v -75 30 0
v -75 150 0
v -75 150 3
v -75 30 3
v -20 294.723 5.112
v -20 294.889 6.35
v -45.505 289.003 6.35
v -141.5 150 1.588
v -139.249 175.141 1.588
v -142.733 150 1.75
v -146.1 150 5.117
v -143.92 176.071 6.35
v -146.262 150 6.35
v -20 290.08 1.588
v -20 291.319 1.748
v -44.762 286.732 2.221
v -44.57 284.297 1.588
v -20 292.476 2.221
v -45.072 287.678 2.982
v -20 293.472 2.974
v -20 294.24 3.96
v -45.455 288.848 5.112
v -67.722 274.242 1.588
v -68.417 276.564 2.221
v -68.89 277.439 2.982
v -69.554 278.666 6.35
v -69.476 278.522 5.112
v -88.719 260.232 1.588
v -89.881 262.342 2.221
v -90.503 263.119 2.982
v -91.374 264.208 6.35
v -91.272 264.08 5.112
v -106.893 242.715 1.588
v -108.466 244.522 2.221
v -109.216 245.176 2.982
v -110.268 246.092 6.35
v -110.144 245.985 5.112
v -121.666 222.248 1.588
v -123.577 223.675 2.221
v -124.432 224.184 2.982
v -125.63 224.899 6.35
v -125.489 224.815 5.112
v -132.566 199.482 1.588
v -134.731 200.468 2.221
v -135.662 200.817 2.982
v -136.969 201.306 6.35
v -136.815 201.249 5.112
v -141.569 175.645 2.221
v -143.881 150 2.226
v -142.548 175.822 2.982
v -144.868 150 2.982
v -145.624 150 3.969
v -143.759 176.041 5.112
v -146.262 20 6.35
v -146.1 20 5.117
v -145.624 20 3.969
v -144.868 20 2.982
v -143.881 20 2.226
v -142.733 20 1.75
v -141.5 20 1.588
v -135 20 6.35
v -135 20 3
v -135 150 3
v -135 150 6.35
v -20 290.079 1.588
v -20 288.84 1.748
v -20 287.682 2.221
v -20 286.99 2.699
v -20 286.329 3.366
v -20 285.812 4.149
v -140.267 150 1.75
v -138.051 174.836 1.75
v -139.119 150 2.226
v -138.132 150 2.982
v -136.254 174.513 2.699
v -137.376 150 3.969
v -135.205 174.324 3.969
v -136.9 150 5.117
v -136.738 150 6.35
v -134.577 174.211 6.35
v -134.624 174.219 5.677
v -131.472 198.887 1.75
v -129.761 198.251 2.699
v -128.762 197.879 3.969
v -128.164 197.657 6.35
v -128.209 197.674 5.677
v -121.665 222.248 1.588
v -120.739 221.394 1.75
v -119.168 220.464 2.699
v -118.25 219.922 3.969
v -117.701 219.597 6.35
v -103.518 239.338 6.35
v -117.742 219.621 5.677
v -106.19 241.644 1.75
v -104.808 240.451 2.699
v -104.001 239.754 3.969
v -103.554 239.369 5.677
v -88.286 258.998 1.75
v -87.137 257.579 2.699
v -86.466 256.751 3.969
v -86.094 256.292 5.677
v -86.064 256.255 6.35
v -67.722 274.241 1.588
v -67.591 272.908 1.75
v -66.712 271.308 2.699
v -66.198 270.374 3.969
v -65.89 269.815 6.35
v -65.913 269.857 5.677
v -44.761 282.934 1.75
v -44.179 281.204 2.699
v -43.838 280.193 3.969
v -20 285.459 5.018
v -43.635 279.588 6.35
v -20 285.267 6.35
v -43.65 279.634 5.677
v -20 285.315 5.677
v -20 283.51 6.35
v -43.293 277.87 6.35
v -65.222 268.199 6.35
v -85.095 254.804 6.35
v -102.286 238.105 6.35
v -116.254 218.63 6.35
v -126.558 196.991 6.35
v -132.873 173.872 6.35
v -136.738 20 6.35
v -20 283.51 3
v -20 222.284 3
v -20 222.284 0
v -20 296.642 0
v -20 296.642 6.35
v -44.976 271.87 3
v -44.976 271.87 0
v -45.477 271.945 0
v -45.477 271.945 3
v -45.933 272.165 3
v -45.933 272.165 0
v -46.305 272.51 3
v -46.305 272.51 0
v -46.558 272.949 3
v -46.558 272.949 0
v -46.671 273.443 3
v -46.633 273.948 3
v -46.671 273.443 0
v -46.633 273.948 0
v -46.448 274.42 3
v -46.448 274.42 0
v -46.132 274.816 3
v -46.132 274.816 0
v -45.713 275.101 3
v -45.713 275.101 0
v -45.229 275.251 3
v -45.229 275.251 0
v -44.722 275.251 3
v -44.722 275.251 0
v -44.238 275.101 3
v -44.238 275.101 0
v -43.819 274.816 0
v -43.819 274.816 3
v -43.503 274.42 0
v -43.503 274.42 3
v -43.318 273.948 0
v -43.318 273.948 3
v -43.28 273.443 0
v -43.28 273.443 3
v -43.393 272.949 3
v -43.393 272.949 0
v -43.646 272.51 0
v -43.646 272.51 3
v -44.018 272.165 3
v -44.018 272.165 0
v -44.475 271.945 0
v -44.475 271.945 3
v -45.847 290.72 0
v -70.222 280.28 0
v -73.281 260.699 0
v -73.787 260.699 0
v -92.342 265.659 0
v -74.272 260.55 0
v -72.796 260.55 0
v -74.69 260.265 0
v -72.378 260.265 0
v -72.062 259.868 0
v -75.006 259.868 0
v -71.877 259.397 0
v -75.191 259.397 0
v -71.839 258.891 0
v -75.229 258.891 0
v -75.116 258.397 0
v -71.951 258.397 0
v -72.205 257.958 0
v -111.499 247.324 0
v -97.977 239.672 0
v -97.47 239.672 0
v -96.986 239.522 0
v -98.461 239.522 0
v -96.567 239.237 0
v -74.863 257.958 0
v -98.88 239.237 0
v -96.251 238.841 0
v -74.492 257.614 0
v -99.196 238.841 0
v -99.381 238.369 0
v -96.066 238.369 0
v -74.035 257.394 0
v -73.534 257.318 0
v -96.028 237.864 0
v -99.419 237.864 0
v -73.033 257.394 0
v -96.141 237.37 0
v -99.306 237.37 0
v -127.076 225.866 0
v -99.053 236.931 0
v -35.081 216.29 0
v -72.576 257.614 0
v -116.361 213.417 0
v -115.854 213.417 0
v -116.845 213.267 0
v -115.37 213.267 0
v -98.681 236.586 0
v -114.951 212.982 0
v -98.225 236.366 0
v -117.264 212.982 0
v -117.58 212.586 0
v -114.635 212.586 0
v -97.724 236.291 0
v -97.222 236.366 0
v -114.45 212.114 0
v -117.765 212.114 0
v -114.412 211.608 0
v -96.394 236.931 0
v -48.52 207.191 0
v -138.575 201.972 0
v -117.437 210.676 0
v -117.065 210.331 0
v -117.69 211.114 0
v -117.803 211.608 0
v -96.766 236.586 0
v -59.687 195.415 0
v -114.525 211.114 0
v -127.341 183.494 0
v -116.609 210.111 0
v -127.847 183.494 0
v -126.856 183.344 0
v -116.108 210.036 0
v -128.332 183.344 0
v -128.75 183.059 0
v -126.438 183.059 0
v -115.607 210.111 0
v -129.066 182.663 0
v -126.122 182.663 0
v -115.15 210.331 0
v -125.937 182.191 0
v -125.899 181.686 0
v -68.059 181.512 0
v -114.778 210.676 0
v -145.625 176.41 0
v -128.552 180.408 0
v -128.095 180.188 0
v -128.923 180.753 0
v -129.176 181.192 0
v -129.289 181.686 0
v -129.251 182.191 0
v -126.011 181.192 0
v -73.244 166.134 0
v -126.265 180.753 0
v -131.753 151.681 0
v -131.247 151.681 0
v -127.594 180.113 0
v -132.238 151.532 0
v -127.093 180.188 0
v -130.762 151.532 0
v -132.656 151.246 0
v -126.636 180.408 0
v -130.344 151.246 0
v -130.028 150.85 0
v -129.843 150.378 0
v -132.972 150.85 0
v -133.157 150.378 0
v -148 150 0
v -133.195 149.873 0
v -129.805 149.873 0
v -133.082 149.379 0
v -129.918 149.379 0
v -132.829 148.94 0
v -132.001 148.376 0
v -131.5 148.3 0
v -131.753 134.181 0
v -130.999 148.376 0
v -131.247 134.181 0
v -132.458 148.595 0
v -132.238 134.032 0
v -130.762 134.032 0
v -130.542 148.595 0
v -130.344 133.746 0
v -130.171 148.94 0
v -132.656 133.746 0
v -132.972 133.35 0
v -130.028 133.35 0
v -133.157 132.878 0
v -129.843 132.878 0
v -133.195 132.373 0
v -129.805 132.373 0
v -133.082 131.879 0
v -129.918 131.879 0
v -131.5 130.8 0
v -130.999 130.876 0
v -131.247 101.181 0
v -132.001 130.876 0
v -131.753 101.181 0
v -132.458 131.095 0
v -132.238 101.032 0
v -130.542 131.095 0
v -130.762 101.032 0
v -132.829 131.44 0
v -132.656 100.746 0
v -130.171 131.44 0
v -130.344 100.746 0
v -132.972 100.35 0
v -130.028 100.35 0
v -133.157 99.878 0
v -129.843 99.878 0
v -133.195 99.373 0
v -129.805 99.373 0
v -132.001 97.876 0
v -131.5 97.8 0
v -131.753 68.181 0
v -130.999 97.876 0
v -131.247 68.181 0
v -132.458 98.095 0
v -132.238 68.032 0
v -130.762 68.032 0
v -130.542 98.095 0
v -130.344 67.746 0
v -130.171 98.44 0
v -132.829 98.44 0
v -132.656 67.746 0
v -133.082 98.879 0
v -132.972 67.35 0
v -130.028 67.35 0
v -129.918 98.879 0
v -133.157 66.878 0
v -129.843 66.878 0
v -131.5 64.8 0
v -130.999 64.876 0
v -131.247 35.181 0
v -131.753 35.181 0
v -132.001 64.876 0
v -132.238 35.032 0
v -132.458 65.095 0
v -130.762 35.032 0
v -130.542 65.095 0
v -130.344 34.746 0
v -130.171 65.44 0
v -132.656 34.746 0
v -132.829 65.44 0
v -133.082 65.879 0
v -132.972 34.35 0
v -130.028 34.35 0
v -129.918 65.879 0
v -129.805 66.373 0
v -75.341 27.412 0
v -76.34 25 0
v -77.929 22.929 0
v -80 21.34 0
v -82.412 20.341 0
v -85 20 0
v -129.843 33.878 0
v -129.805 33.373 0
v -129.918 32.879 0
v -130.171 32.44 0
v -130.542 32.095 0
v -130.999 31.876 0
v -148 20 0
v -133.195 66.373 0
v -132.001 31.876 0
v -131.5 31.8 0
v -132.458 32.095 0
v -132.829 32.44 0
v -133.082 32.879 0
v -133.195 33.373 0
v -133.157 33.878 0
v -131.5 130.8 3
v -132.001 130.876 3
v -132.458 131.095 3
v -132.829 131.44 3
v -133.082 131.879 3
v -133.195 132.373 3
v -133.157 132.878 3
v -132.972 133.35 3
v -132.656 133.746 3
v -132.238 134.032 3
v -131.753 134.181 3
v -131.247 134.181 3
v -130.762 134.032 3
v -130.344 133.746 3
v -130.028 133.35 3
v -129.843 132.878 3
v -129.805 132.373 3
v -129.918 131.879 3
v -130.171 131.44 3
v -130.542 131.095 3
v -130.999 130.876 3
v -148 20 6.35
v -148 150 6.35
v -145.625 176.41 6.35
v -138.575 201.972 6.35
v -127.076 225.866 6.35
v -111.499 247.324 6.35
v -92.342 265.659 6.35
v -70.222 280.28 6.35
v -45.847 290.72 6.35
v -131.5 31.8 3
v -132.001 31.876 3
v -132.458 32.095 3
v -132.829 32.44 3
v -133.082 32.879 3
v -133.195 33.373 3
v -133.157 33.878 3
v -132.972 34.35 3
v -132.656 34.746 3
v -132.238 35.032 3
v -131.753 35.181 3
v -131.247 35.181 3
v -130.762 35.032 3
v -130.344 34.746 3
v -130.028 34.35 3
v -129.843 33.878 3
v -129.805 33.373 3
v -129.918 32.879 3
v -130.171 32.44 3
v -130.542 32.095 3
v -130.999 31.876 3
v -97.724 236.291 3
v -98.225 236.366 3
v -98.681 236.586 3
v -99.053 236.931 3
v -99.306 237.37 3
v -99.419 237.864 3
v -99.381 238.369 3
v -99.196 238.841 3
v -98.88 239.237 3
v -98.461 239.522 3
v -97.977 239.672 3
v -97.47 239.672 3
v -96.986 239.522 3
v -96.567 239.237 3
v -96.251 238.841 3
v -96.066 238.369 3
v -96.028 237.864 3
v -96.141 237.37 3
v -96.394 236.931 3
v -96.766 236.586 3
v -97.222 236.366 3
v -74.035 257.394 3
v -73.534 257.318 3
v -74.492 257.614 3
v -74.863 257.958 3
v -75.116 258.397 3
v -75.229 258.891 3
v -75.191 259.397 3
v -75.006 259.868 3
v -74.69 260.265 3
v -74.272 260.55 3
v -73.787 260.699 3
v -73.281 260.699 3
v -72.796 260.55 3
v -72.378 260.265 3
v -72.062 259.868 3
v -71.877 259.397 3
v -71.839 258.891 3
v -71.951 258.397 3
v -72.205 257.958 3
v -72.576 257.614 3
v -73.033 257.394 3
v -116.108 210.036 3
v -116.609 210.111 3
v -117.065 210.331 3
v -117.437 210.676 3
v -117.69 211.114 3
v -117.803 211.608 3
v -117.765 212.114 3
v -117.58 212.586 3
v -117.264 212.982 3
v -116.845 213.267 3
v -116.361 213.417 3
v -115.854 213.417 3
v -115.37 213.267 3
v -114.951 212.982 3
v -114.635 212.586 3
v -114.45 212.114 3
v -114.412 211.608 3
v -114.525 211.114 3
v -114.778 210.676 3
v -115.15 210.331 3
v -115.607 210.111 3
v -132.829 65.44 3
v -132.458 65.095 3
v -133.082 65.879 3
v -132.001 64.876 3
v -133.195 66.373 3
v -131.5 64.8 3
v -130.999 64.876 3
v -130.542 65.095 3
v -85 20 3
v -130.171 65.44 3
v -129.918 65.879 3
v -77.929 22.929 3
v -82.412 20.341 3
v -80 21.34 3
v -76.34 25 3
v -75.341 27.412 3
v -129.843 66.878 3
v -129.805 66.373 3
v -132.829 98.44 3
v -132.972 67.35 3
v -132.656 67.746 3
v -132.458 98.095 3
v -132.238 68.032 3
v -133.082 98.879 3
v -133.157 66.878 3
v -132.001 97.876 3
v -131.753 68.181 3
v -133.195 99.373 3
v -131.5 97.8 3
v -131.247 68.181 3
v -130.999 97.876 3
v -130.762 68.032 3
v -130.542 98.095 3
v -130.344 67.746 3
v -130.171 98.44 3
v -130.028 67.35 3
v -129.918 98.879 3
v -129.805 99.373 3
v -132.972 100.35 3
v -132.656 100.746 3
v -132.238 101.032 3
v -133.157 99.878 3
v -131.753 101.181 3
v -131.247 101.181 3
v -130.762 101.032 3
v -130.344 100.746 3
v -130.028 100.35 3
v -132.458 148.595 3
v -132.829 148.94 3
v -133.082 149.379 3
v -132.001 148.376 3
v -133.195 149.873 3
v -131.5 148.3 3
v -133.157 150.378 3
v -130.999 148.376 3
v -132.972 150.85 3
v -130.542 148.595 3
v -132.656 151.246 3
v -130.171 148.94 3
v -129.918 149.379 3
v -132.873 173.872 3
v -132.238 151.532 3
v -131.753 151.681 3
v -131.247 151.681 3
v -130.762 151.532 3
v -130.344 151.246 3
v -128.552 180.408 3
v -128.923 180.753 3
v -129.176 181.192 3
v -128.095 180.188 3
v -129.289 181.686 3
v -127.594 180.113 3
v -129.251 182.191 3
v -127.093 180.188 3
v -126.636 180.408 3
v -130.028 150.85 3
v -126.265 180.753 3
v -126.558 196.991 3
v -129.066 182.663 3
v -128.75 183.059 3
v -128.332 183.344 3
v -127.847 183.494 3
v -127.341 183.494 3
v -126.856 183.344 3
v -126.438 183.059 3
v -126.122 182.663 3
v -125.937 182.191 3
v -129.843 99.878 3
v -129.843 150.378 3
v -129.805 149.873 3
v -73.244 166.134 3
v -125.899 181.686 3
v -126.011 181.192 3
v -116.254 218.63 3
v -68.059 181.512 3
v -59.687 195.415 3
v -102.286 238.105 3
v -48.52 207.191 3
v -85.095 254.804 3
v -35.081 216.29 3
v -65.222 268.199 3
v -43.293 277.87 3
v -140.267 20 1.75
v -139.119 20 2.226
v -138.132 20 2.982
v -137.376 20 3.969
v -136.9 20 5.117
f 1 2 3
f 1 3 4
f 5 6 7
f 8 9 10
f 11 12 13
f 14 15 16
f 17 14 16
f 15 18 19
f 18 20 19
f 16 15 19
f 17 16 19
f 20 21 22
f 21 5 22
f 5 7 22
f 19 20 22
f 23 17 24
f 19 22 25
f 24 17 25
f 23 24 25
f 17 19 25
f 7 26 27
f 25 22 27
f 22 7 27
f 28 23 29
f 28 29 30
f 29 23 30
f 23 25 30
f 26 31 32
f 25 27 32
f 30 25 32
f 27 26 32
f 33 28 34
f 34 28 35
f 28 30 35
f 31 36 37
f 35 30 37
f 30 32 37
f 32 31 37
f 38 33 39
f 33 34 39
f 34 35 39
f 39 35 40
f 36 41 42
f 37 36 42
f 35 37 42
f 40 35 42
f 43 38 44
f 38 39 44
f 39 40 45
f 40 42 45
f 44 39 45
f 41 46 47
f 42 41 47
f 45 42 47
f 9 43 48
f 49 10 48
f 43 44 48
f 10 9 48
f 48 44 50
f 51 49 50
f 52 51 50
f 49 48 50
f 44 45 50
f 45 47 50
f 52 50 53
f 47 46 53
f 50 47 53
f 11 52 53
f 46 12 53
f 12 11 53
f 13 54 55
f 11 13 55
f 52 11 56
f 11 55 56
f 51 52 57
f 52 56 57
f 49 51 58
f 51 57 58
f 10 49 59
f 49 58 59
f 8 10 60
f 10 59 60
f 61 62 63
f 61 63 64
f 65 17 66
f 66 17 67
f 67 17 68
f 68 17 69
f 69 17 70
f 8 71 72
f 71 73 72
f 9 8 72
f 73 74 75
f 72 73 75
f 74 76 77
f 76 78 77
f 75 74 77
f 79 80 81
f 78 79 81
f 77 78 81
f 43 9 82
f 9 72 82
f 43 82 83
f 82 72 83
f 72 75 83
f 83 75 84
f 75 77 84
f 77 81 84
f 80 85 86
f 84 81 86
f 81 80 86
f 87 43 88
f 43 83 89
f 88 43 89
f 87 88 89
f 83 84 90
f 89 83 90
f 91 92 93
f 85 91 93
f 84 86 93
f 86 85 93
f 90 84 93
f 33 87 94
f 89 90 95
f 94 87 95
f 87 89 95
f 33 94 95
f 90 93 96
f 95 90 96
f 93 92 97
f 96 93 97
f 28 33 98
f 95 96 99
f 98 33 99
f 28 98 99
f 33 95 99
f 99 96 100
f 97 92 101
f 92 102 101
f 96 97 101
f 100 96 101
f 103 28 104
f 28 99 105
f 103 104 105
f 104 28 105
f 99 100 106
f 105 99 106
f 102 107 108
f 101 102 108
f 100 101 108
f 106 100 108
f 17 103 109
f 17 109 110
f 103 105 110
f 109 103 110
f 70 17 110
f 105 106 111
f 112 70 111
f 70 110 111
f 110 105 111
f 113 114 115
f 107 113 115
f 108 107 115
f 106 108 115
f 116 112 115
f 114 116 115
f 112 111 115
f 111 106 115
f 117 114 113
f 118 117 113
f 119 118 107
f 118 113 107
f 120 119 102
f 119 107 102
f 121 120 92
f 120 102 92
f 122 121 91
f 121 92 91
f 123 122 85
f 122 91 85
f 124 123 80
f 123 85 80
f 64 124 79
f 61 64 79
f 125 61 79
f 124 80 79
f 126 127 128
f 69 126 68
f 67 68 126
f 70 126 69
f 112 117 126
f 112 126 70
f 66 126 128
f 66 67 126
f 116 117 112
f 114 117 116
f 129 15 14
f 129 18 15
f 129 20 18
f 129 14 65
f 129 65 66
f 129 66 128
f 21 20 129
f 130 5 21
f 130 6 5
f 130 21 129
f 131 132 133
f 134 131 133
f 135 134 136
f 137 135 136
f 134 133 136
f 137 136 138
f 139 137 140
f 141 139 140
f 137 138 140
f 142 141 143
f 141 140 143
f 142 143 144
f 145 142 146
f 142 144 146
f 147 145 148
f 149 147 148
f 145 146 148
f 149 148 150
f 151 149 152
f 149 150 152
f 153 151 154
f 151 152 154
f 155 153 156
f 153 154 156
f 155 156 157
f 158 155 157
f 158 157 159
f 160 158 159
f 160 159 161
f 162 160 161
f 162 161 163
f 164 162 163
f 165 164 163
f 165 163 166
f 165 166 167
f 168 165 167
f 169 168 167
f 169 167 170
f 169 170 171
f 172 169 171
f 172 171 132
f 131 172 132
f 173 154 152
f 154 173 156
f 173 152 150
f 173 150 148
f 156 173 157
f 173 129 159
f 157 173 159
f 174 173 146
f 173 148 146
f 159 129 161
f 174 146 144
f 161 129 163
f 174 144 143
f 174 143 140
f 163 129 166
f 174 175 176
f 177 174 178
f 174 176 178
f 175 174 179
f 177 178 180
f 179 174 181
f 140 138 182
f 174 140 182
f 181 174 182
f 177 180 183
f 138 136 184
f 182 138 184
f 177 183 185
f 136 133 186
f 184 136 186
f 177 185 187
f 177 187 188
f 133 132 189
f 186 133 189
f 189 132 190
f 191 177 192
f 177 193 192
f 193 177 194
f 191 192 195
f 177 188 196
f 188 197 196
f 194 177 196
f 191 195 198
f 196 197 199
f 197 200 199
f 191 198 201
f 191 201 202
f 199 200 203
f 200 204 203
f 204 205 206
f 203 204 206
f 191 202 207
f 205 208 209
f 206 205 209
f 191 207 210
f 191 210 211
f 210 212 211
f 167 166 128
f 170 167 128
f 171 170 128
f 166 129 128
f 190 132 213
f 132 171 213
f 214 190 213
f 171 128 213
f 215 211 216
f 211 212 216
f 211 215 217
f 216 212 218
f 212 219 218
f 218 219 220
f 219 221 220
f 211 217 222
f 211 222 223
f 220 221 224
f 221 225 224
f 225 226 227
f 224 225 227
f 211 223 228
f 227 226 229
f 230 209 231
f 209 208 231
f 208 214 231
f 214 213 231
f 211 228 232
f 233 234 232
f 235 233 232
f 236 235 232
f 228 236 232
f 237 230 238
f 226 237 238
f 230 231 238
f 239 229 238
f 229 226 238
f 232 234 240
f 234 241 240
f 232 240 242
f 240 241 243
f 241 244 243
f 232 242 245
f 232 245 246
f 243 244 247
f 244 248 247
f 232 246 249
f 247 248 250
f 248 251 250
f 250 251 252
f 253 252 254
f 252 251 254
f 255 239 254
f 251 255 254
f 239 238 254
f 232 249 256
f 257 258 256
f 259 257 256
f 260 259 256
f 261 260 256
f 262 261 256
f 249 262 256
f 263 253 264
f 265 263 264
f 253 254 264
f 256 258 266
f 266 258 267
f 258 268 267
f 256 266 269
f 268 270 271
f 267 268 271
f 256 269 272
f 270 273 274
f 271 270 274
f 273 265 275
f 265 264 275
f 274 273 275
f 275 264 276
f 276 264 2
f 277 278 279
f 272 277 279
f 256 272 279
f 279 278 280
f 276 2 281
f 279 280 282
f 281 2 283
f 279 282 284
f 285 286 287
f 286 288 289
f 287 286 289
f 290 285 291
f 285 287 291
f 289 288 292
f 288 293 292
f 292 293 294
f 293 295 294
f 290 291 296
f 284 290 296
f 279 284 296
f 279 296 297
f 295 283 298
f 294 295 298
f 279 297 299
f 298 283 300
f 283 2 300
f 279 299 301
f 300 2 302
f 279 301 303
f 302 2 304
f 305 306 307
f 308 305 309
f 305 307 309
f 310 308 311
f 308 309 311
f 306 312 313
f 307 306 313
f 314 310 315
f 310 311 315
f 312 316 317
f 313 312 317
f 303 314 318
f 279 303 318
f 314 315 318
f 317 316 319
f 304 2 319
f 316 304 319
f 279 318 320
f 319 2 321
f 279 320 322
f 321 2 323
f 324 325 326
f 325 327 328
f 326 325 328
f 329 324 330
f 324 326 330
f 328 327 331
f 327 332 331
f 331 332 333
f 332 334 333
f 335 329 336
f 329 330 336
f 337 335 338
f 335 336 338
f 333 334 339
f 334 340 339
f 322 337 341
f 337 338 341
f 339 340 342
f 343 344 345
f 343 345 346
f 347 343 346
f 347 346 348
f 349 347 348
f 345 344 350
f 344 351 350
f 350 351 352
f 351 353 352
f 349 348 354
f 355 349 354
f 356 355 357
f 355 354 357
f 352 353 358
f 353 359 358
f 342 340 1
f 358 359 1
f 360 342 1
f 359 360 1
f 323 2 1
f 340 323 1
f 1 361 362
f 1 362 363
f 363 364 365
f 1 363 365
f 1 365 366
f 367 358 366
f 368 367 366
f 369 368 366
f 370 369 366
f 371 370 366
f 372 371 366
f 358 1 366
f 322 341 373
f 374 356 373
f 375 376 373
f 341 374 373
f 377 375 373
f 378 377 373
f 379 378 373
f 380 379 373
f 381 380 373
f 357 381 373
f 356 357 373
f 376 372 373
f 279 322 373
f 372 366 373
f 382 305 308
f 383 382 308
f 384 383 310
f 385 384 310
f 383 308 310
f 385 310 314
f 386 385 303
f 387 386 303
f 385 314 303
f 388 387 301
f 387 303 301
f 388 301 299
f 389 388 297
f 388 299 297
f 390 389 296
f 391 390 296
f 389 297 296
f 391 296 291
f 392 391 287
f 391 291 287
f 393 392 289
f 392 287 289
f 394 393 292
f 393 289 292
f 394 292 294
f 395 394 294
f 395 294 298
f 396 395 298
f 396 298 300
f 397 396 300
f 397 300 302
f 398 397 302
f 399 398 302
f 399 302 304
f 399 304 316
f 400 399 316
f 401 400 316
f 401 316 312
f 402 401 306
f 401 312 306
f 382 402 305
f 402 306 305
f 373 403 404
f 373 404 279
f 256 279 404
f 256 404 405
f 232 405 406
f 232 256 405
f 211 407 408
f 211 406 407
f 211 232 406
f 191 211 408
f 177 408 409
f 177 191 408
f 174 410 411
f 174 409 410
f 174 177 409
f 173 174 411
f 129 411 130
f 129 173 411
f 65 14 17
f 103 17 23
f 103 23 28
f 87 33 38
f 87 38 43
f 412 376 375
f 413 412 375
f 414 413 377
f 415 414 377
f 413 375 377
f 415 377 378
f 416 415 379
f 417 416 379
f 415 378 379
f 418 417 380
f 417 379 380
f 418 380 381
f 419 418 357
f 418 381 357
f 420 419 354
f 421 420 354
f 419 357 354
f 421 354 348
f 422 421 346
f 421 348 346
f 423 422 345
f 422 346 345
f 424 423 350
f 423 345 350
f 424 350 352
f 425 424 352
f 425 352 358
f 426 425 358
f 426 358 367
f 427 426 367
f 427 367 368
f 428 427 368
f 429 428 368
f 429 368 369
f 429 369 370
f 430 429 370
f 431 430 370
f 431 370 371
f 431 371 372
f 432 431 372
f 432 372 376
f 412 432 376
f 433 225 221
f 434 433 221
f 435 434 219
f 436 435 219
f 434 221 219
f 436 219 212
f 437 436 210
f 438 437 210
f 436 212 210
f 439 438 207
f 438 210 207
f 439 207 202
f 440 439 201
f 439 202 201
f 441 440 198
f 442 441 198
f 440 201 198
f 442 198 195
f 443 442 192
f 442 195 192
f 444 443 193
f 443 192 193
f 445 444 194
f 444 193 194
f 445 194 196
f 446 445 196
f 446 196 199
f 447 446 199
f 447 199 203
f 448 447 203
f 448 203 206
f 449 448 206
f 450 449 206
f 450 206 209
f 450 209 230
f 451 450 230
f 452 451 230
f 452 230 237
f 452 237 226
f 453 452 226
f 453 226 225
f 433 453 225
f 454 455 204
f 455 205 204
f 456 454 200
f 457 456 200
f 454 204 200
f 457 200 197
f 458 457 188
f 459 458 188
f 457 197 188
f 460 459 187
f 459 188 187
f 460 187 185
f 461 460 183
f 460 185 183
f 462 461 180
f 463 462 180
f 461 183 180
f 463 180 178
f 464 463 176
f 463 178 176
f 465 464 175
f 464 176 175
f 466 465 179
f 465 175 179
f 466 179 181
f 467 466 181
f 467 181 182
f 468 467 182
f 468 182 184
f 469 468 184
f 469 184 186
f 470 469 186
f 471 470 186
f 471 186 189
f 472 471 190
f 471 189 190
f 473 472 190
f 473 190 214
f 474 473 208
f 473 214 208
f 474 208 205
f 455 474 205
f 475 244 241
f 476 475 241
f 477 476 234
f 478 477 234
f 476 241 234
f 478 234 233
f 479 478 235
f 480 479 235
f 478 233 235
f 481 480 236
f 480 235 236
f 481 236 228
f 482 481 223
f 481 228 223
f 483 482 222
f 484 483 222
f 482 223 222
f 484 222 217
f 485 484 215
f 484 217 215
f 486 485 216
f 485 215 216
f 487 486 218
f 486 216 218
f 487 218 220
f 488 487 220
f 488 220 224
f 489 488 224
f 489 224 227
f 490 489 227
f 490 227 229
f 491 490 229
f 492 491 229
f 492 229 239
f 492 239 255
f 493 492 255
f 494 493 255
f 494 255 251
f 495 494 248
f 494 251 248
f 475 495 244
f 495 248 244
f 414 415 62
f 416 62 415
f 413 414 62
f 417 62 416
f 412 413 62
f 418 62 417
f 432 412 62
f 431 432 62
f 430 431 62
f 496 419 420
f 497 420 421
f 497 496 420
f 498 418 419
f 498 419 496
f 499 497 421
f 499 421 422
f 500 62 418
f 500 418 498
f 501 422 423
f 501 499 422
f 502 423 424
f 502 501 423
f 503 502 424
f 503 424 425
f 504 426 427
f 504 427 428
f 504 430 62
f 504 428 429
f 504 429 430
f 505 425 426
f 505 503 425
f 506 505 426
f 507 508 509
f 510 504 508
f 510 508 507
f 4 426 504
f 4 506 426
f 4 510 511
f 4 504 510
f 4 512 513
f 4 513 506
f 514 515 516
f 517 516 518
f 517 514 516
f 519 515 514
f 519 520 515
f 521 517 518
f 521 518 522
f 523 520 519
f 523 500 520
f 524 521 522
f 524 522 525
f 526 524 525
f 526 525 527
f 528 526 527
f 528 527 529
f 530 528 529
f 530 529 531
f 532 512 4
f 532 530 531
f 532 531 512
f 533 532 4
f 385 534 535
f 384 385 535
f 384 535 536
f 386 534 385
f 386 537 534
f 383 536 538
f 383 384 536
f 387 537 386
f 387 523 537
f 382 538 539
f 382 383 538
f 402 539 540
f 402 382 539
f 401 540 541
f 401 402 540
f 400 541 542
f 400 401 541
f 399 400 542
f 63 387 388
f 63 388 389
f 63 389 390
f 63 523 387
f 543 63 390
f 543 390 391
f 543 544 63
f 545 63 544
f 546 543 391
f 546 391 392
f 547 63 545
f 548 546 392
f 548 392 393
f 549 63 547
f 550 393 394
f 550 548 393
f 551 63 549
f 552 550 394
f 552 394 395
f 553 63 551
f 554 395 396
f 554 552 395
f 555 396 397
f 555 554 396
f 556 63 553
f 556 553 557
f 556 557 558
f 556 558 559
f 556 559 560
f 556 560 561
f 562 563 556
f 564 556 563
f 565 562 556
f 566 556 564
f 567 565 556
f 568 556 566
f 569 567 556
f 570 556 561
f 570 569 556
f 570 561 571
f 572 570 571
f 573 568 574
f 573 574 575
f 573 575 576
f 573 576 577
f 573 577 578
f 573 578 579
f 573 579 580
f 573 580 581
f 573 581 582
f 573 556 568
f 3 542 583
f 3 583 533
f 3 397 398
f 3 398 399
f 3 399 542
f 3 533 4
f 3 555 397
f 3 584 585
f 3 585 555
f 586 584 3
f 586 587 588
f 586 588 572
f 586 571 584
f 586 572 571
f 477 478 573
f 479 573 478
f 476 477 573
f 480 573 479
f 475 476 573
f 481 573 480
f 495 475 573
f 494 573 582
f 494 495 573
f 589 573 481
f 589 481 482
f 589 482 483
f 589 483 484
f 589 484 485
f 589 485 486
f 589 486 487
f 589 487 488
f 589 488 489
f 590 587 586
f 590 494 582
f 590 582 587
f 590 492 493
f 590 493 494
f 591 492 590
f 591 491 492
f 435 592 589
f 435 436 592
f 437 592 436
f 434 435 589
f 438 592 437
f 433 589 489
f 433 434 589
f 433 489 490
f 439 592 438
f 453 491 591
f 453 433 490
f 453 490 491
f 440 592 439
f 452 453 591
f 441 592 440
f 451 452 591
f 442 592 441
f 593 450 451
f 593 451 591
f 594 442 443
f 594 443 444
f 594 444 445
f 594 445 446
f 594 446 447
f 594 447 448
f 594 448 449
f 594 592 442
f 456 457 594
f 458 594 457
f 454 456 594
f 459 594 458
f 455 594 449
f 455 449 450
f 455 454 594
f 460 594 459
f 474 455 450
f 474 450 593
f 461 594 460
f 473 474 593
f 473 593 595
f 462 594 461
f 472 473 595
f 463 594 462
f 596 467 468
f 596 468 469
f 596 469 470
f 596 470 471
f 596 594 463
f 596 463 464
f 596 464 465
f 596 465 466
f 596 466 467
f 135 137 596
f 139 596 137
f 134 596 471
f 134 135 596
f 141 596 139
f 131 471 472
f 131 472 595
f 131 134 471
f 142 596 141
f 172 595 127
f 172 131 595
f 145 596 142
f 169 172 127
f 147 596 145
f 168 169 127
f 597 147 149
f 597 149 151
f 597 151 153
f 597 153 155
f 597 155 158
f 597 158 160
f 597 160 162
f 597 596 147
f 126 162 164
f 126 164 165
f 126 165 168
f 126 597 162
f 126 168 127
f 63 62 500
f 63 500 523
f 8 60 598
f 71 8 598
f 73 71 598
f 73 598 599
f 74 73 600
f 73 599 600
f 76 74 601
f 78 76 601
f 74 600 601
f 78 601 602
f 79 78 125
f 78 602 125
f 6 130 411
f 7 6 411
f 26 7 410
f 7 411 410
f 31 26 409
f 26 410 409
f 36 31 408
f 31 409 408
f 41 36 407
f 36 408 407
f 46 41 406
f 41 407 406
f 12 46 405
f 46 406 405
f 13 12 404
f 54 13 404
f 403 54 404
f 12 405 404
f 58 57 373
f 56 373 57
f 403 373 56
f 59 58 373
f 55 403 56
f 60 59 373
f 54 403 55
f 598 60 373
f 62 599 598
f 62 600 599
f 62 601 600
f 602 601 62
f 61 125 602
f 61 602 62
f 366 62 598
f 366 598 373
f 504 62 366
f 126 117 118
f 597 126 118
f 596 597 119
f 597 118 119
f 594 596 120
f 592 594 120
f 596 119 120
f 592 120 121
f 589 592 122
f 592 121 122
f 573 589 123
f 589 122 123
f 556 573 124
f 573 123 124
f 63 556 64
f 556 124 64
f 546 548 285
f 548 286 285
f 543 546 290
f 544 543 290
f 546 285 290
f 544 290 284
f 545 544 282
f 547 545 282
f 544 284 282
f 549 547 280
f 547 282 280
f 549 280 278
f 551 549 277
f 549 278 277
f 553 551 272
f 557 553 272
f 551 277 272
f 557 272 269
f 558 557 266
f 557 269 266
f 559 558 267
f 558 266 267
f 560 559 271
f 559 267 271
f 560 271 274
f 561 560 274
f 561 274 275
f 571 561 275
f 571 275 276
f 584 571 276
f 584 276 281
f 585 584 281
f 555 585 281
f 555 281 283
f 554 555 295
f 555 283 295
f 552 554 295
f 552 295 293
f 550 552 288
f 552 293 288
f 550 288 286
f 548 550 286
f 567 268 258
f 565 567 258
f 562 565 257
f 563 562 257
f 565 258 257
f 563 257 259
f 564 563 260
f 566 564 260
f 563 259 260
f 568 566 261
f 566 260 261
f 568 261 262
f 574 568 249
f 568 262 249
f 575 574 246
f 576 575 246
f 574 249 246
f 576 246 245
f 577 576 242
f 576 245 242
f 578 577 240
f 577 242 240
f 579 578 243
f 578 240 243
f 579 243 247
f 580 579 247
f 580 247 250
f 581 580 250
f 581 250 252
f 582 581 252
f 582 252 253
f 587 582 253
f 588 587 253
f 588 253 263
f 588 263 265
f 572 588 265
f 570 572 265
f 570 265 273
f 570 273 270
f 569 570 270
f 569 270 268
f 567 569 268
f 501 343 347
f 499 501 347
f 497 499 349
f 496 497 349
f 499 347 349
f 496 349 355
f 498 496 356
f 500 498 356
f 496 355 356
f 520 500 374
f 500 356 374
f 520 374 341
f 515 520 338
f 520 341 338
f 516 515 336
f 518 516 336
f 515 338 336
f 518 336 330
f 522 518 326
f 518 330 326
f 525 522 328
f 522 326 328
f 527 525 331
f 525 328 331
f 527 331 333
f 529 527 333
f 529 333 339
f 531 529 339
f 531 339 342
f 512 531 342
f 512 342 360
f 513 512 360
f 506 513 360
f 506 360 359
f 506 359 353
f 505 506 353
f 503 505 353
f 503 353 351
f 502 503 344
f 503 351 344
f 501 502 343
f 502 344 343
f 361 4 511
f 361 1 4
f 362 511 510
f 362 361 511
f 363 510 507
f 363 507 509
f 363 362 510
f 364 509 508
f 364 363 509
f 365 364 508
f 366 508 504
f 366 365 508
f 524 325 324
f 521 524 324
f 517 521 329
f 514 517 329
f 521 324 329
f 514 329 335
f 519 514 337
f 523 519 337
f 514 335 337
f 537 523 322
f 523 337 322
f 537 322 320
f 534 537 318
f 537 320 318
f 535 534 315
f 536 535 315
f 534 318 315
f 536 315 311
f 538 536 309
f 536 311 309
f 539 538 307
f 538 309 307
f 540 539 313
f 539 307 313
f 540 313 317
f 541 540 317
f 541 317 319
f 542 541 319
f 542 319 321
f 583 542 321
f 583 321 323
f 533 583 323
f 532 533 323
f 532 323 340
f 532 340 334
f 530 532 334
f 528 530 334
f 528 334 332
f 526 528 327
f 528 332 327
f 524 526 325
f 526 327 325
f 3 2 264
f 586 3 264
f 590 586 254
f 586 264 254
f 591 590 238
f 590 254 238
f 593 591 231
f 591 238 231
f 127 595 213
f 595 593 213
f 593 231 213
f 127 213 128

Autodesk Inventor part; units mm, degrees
ref_plane "YZ Plane" through (0, 0, 0) normal (1, 0, 0) x (0, 1, 0)
ref_plane "XZ Plane" through (0, 0, 0) normal (0, 1, 0) x (-1, 0, 0)
ref_plane "Work Plane1" through (0, 0, 0) normal (0, 0, 1) x (1, 0, 0)
sketch "Sketch1" plane through (0, 0, 0) normal (0, 0, 1) x (1, 0, 0)
  line L0 (-135, 150) -> (-135, -150)
  arc A0 (-135, -150) -> (135, -150) centre (0, -150) ccw
  line L1 (135, -150) -> (135, 150)
  arc A1 (135, 150) -> (-135, 150) centre (0, 150) ccw
  line L2 (-80, -150) -> (-80, 150)
  arc A2 (80, 150) -> (-80, 150) centre (0, 150) ccw
  line L3 (80, 150) -> (80, -150)
  arc A3 (-80, -150) -> (80, -150) centre (0, -150) ccw
  line L4 (0, 0) -> (-135, 0)
  line L5 (0, 0) -> (0, 285)
  line L6 (-75, 150) -> (-75, -150)
  arc A4 (-75, -150) -> (75, -150) centre (0, -150) ccw
  line L7 (75, -150) -> (75, 150)
  arc A5 (75, 150) -> (-75, 150) centre (0, 150) ccw
  point P0 (0, 230)
  point P1 (-80, 0)
  point P2 (0, 225)
  point P3 (-75, 0)
  point P4 (135, 0)
  point P5 (-75, 0)
  point P6 (0, -230)
  dimension "d18" = 5
  dimension "d34" = 300
  dimension "d37" = 55
  dimension "d38" = 75
  dimension "d39" = 75
extrude "Extrusion1" add sketch "Sketch1" along normal blind 3 contours A1 L5 A2 L2 L4 L0 | L2 A2 L5 A5 L6 L4
sketch "Sketch2" plane through (0, 0, 3) normal (0, 0, 1) x (1, 0, 0)
  arc A0 (0, 285) -> (-135, 150) centre (0, 150) ccw projected
  line L0 (-135, 150) -> (-135, 0) projected
  line L1 (-135, 0) -> (-75, 0) construction
  line L2 (0, 225) -> (0, 285) construction
  line L3 (-75, 0) -> (-75, 150) projected
  arc A1 (0, 225) -> (-75, 150) centre (0, 150) ccw projected
  point P0 (0, 0)
sketch "Sketch3" plane through (-135, 0, 0) normal (0, -1, 0) x (1, 0, 0)
  line L0 (0, 0) -> (-13, 0)
  line L1 (-13, 0) -> (-13, 6.35)
  line L2 (-13, 6.35) -> (0, 6.35)
  line L3 (0, 6.35) -> (0, 0)
  circle A0 centre (-6.5, 6.35) radius 4.7625 construction
  line L4 (-11.2625, 11.1125) -> (-1.7375, 11.1125)
  line L5 (-1.7375, 11.1125) -> (-1.7375, 1.5875)
  line L6 (-1.7375, 1.5875) -> (-11.2625, 1.5875)
  line L7 (-11.2625, 1.5875) -> (-11.2625, 11.1125)
  line L8 (-11.2625, 11.1125) -> (-1.7375, 1.5875) construction
  line L9 (-1.7375, 11.1125) -> (-11.2625, 1.5875) construction
  point P0 (135, 0)
  point P1 (-1.7375, 6.35)
  point P2 (-11.2625, 6.35)
  point P3 (-1.7375, 6.35)
  point P4 (-11.2625, 6.35)
  dimension "d2" = 13
  dimension "d3" = 6.35
  dimension "d4" = 9.525
  dimension "d5" = 0
sweep "Sweep1" add profiles "Sketch3" path "Sketch2" path curves L0 A0 contours L0 L1 L2 L7 L6 L5 L3
sketch "Sketch6" plane through (-75, 0, 0) normal (0, -1, 0) x (1, 0, 0)
  arc A0 (-63.7625, 6.35) -> (-54.2375, 6.35) centre (-59, 6.35) ccw projected
  circle A1 centre (-59, 6.35) radius 4.7625
  circle A2 centre (-59, 6.35) radius 3.175
  point P0 (75, 0)
  point P1 (-54.2375, 6.35)
  dimension "d14" = 9.525
  dimension "d15" = 6.35
sketch3d "3D Sketch1"
sweep "Sweep2" [suppressed]
sketch "Sketch4" plane through (0, 0, 3) normal (0, 0, 1) x (1, 0, 0)
  line L0 (0, 0) -> (-148.7625, 0)
  line L1 (-148.7625, 0) -> (-148.7625, 20)
  line L2 (-148.7625, 20) -> (0, 20)
  line L3 (0, 20) -> (0, 0)
  line L4 (0, 0) -> (-20, 0)
  line L5 (-20, 0) -> (-20, 308)
  line L6 (-20, 308) -> (0, 308)
  line L7 (0, 308) -> (0, 0)
  line L8 (-138.7625, 0) -> (-138.7625, 300) projected
  point P0 (0, 298)
  point P1 (-20, 20)
  point P2 (-138.7625, 20)
  dimension "d8" = 20
  dimension "d9" = 20
  dimension "d10" = 10
  dimension "d11" = 10
extrude "Extrusion2" cut sketch "Sketch4" against normal through all both and the other way through all contours L0 L8 L2 L5 | L2 L5 L6 L7 | L0 L1 L2 L8 bodies 1
sketch "Sketch7" plane through (0, 0, 3) normal (0, 0, 1) x (1, 0, 0)
  line L0 (-20, 222.2842) -> (-20, 283.5103) projected
  arc A0 (-20, 283.5103) -> (-135, 150) centre (0, 150) ccw projected
  line L1 (-135, 150) -> (-135, 0) projected
  line L2 (-135, 20) -> (-75, 20) projected
  line L3 (-75, 20) -> (-75, 150) projected
  arc A1 (-20, 222.2842) -> (-75, 150) centre (0, 150) ccw projected
  line L4 (-78.5, 150) -> (-78.5, 23.5)
  line L5 (-78.5, 23.5) -> (-131.5, 23.5)
  line L6 (-131.5, 23.5) -> (-131.5, 150)
  arc A2 (-23.5, 279.3832) -> (-131.5, 150) centre (0, 150) ccw
  line L7 (-23.5, 279.3832) -> (-23.5, 224.8999)
  arc A3 (-23.5, 224.8999) -> (-78.5, 150) centre (0, 150) ccw
  point P0 (0, 0)
  point P1 (-131.5, 33.5)
  point P2 (-127.5939, 181.8127)
  point P3 (-116.1076, 211.7355)
  point P4 (-97.7235, 237.9907)
  point P5 (-73.5339, 259.0184)
  point P6 (-44.9756, 273.5696)
  point P7 (-131.5, 66.5)
  point P8 (-131.5, 99.5)
  point P9 (-131.5, 132.5)
  dimension "d21" = 3.5
  dimension "d24" = 70
  dimension "d26" = 10
  dimension "d29" = 33
hole "Hole1" at (-131.5, 33.5, 3) at (-131.5, 150, 3) at (-127.5939, 181.8127, 3) at (-116.1076, 211.7355, 3) at (-97.7235, 237.9907, 3) at (-73.5339, 259.0184, 3) at (-44.9756, 273.5696, 3) at (-131.5, 66.5, 3) at (-131.5, 99.5, 3) at (-131.5, 132.5, 3) direction (0, 0, -1) diameter 3.4 end through all bodies 1
fillet "Fillet1" radius 10 1 edges at (-75, 20, 1.5)
sketch "Sketch8" plane through (0, 0, 3) normal (0, 0, 1) x (1, 0, 0)
  arc A0 (-85, 20) -> (-75, 30) centre (-85, 30) ccw projected
  line L0 (-75, 30) -> (-75, 150) projected
  arc A1 (-20, 222.2842) -> (-75, 150) centre (0, 150) ccw projected
  line L1 (-20, 222.2842) -> (-20, 283.5103) projected
  arc A2 (-20, 283.5103) -> (-135, 150) centre (0, 150) ccw projected
  line L2 (-135, 150) -> (-135, 20) projected
  line L3 (-135, 20) -> (-85, 20) projected
  line L4 (-74.9, 150) -> (-74.9, 30)
  arc A3 (-85, 19.9) -> (-74.9, 30) centre (-85, 30) ccw
  line L5 (-85, 19.9) -> (-135.1, 19.9)
  line L6 (-135.1, 19.9) -> (-135.1, 150)
  arc A4 (-19.9, 283.6263) -> (-135.1, 150) centre (0, 150) ccw
  line L7 (-19.9, 283.6263) -> (-19.9, 222.208)
  arc A5 (-19.9, 222.208) -> (-74.9, 150) centre (0, 150) ccw
  point P0 (0, 0)
  dimension "d48" = 0.1
extrude "Extrusion3" [suppressed]
sketch "Sketch11" plane through (0, 0, 3) normal (0, 0, 1) x (1, 0, 0)
  line L0 (-135, 150) -> (-135, 20) projected
  circle A0 centre (-131.5, 99.5) radius 1.7 projected
  circle A1 centre (-44.9756, 273.5696) radius 1.7 projected
  circle A2 centre (-97.7235, 237.9907) radius 1.7 projected
  circle A3 centre (-127.5939, 181.8127) radius 1.7 projected
  circle A4 centre (-131.5, 33.5) radius 1.7 projected
  circle A5 centre (-131.5, 150) radius 1.7 projected
  circle A6 centre (-116.1076, 211.7355) radius 1.7 projected
  circle A7 centre (-73.5339, 259.0184) radius 1.7 projected
  circle A8 centre (-131.5, 66.5) radius 1.7 projected
  circle A9 centre (-131.5, 132.5) radius 1.7 projected
  line L1 (-20, 277.0859) -> (-20, 222.2842)
  arc A10 (-20, 222.2842) -> (-75, 150) centre (0, 150) ccw projected
  arc A11 (-23, 224.5319) -> (-78, 150) centre (0, 150) ccw
  line L2 (-23, 224.5319) -> (-23, 276.5773)
  line L3 (-135, 20) -> (-85, 20) projected
  line L4 (-128.65, 20) -> (-85, 20)
  arc A12 (-85, 20) -> (-75, 30) centre (-85, 30) ccw projected
  arc A13 (-85, 23) -> (-78, 30) centre (-85, 30) ccw
  line L5 (-85, 23) -> (-131.0405, 23)
  line L6 (-78, 150) -> (-78, 30)
  arc A14 (-85, 20) -> (-75, 30) centre (-85, 30) ccw projected
  line L7 (-75, 30) -> (-75, 150) projected
  line L8 (-20, 222.2842) -> (-20, 283.5103) projected
  arc A15 (-20, 283.5103) -> (-135, 150) centre (0, 150) ccw projected
  point P0 (0, 0)
  dimension "d53" = 3
  dimension "d54" = 3
sketch "Sketch12" plane through (0, 0, 3) normal (0, 0, 1) x (1, 0, 0)
  arc A0 (-85, 20) -> (-75, 30) centre (-85, 30) ccw projected
  line L0 (-75, 30) -> (-75, 150) projected
  arc A1 (-20, 222.2842) -> (-75, 150) centre (0, 150) ccw projected
  line L1 (-20, 222.2842) -> (-20, 283.5103) projected
  arc A2 (-20, 283.5103) -> (-135, 150) centre (0, 150) ccw projected
  line L2 (-135, 150) -> (-135, 20) projected
  line L3 (-135, 20) -> (-85, 20) projected
  circle A3 centre (-131.5, 99.5) radius 1.7 projected
  circle A4 centre (-44.9756, 273.5696) radius 1.7 projected
  circle A5 centre (-97.7235, 237.9907) radius 1.7 projected
  circle A6 centre (-127.5939, 181.8127) radius 1.7 projected
  circle A7 centre (-131.5, 33.5) radius 1.7 projected
  circle A8 centre (-131.5, 150) radius 1.7 projected
  circle A9 centre (-116.1076, 211.7355) radius 1.7 projected
  circle A10 centre (-73.5339, 259.0184) radius 1.7 projected
  circle A11 centre (-131.5, 66.5) radius 1.7 projected
  circle A12 centre (-131.5, 132.5) radius 1.7 projected
  point P0 (0, 0)
  point P1 (-106.1535, 4.76)
  point P2 (-134.9295, 287.3233)
  dimension "d55" = 15.24
fillet "Fillet2" radius 4.7625 4 edges at (-110.2678, 246.0923, 1.5875) (-146.2625, 85, 1.5875) (-103.5179, 239.3375, 1.5875) (-136.7375, 85, 1.5875)
equation "\"d39\" = d38"
properties part number "1122_Middle Heat Sink_V1" material "Aluminum 6061"
